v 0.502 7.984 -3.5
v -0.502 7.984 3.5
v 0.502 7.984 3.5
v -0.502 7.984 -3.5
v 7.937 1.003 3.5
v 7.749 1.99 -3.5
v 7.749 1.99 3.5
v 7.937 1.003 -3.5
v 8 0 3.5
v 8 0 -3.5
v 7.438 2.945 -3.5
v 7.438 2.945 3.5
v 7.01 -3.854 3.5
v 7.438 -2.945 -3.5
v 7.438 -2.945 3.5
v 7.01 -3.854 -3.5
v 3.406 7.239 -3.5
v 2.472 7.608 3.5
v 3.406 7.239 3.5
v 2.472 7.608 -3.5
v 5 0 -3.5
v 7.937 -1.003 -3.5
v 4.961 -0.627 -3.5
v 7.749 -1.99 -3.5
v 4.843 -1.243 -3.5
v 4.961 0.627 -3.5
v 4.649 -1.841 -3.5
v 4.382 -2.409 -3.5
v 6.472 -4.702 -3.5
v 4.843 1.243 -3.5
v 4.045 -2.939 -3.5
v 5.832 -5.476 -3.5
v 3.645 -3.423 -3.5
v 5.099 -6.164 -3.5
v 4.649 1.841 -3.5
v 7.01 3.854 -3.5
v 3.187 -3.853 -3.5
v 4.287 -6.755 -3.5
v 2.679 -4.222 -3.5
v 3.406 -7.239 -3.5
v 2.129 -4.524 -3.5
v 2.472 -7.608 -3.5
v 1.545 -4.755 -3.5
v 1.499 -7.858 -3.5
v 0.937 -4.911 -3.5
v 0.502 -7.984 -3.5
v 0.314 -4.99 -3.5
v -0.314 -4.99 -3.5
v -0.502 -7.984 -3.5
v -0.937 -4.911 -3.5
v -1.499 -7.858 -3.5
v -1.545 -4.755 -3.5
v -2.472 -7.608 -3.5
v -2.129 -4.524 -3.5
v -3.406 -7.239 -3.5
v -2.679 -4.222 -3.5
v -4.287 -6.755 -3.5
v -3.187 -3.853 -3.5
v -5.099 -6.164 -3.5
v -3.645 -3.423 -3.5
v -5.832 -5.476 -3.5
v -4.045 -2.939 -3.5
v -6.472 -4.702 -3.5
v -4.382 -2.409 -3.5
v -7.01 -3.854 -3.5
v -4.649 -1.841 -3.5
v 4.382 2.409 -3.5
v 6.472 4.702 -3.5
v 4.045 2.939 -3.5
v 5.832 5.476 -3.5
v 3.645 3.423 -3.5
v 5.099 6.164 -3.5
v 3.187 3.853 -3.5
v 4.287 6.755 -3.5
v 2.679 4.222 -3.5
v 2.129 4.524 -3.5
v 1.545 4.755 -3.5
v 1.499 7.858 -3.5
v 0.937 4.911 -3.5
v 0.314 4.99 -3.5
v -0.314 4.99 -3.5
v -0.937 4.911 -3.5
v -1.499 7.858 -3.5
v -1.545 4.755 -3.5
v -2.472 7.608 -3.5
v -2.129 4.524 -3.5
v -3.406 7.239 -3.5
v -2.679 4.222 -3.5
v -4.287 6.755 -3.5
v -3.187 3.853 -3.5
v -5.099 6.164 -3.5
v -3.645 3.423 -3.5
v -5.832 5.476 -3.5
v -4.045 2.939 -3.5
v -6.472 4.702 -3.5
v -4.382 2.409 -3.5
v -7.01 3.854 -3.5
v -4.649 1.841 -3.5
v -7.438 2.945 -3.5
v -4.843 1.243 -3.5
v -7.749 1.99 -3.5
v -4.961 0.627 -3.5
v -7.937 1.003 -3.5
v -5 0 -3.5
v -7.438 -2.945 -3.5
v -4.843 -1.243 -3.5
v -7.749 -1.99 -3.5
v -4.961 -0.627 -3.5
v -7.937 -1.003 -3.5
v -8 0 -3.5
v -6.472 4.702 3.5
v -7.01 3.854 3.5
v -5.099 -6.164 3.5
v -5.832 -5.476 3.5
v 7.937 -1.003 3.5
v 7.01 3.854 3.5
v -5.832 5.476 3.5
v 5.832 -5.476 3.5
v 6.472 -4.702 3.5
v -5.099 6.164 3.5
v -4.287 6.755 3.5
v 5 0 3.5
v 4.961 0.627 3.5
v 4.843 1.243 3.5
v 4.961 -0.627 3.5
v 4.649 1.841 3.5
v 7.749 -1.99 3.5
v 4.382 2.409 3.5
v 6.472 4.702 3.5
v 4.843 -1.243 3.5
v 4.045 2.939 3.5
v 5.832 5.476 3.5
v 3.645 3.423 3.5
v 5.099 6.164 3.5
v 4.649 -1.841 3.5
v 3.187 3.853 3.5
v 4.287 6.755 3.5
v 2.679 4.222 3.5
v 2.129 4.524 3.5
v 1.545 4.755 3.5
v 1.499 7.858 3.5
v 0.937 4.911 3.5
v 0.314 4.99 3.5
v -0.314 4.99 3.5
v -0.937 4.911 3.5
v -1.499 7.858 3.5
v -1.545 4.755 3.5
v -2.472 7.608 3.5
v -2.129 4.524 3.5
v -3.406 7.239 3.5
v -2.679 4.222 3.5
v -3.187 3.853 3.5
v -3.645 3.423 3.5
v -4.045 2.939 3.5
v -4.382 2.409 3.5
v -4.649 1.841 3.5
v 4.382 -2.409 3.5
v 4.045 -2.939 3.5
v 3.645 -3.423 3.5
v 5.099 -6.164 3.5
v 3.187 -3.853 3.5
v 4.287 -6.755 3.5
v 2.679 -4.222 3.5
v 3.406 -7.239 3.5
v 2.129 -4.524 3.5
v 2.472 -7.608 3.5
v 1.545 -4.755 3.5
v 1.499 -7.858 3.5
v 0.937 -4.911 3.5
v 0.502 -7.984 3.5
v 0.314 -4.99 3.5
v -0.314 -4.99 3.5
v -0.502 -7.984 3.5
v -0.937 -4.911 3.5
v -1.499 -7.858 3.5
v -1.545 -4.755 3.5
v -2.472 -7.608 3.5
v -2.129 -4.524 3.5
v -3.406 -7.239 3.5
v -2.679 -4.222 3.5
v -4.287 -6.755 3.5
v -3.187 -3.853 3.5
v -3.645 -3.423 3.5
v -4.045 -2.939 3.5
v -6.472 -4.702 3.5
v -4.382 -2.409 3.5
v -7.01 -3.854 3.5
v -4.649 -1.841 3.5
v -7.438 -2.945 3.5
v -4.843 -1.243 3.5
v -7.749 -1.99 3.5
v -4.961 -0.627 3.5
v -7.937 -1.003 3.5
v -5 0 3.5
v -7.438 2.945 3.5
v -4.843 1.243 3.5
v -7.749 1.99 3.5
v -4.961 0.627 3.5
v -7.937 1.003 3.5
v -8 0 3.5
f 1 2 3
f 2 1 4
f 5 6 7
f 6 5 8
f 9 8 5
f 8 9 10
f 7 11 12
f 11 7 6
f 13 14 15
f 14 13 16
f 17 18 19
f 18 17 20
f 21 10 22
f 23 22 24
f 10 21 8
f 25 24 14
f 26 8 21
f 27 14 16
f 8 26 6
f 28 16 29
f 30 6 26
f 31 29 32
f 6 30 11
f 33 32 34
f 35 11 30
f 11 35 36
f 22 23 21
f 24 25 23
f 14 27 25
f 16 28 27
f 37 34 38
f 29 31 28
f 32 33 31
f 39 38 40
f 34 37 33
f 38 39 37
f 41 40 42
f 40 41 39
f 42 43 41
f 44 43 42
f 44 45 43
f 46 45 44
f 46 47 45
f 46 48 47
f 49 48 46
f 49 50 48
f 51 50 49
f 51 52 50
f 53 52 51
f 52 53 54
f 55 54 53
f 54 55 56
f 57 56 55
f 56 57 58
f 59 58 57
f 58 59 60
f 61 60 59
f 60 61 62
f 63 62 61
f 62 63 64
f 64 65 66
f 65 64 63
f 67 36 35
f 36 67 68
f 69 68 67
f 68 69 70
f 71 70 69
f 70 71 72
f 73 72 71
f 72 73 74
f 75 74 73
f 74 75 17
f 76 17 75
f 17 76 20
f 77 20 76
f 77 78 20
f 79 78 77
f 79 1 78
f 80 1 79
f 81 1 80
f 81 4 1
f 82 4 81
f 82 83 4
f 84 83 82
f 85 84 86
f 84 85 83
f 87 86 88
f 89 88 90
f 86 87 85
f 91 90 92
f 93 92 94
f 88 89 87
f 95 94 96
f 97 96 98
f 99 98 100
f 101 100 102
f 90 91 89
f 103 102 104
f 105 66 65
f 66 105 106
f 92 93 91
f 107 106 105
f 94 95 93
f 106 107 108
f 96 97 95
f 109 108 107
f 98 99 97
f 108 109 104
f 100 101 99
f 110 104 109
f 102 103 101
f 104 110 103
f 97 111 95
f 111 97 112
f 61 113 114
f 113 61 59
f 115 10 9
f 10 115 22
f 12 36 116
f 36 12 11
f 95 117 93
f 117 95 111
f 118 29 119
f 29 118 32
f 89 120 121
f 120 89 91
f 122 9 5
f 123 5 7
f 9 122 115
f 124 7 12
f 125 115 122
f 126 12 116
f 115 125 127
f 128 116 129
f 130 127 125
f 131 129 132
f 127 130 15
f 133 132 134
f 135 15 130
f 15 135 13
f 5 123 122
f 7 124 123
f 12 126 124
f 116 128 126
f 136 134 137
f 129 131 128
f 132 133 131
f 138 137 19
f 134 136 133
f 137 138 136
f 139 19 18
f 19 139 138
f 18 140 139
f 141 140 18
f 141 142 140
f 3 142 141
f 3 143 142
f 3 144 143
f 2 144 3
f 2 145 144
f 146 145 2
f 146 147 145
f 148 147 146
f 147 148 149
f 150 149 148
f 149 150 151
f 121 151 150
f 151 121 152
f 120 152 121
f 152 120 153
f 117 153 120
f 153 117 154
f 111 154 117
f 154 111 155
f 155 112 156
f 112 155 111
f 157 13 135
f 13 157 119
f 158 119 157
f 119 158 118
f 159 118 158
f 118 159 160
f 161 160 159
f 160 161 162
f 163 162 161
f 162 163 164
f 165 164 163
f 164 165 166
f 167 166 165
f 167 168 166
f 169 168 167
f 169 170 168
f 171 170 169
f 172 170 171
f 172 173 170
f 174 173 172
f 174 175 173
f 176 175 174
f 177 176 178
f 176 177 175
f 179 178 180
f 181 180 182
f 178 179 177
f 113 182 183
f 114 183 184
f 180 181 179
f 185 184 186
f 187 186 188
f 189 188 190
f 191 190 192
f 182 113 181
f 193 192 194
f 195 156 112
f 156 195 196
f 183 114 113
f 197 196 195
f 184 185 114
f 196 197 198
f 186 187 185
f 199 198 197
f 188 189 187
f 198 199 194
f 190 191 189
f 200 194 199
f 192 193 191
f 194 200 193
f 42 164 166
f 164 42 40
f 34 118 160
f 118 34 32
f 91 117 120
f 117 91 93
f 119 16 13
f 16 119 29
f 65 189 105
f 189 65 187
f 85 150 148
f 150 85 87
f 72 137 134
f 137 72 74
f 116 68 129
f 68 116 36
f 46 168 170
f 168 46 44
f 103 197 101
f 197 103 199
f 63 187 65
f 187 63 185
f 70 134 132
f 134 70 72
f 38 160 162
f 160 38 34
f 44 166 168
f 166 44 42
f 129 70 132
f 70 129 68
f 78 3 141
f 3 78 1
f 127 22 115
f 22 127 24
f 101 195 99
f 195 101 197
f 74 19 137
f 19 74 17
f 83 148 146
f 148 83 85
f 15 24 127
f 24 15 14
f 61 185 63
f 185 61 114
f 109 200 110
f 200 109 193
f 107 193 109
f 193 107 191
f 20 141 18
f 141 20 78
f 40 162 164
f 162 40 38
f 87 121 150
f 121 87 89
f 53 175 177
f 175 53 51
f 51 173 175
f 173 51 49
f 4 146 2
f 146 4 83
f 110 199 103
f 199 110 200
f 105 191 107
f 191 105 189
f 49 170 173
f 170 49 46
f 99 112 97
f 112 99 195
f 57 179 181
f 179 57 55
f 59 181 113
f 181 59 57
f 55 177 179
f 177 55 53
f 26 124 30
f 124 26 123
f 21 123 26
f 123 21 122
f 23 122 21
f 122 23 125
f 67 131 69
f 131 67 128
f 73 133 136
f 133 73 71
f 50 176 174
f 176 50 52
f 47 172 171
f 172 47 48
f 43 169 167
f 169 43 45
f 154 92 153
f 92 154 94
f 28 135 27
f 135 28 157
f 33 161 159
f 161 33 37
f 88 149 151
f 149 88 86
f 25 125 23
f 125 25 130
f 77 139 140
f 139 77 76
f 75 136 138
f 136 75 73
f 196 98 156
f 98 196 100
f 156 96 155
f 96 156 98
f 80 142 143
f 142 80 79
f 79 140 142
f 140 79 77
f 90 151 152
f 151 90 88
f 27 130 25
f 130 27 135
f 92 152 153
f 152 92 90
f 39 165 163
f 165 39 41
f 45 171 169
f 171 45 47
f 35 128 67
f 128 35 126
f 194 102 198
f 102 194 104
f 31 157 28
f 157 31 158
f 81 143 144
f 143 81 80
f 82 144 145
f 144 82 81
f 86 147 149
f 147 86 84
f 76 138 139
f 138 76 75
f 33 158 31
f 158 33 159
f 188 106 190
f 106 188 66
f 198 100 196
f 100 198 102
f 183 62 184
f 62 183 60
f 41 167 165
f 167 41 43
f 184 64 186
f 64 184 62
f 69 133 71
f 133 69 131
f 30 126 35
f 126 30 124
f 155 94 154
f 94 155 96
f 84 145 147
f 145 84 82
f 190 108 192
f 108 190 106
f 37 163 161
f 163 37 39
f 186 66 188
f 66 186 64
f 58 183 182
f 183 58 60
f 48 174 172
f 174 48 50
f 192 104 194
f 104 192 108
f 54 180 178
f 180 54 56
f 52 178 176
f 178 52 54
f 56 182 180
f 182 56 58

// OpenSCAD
$fn = 50;


difference() {
	union() {
		translate(v = [0, 0, -3.5000000000]) {
			cylinder(h = 7, r = 8.0000000000);
		}
	}
	union() {
		translate(v = [0, 0, -100.0000000000]) {
			cylinder(h = 200, r = 5.0000000000);
		}
	}
}
